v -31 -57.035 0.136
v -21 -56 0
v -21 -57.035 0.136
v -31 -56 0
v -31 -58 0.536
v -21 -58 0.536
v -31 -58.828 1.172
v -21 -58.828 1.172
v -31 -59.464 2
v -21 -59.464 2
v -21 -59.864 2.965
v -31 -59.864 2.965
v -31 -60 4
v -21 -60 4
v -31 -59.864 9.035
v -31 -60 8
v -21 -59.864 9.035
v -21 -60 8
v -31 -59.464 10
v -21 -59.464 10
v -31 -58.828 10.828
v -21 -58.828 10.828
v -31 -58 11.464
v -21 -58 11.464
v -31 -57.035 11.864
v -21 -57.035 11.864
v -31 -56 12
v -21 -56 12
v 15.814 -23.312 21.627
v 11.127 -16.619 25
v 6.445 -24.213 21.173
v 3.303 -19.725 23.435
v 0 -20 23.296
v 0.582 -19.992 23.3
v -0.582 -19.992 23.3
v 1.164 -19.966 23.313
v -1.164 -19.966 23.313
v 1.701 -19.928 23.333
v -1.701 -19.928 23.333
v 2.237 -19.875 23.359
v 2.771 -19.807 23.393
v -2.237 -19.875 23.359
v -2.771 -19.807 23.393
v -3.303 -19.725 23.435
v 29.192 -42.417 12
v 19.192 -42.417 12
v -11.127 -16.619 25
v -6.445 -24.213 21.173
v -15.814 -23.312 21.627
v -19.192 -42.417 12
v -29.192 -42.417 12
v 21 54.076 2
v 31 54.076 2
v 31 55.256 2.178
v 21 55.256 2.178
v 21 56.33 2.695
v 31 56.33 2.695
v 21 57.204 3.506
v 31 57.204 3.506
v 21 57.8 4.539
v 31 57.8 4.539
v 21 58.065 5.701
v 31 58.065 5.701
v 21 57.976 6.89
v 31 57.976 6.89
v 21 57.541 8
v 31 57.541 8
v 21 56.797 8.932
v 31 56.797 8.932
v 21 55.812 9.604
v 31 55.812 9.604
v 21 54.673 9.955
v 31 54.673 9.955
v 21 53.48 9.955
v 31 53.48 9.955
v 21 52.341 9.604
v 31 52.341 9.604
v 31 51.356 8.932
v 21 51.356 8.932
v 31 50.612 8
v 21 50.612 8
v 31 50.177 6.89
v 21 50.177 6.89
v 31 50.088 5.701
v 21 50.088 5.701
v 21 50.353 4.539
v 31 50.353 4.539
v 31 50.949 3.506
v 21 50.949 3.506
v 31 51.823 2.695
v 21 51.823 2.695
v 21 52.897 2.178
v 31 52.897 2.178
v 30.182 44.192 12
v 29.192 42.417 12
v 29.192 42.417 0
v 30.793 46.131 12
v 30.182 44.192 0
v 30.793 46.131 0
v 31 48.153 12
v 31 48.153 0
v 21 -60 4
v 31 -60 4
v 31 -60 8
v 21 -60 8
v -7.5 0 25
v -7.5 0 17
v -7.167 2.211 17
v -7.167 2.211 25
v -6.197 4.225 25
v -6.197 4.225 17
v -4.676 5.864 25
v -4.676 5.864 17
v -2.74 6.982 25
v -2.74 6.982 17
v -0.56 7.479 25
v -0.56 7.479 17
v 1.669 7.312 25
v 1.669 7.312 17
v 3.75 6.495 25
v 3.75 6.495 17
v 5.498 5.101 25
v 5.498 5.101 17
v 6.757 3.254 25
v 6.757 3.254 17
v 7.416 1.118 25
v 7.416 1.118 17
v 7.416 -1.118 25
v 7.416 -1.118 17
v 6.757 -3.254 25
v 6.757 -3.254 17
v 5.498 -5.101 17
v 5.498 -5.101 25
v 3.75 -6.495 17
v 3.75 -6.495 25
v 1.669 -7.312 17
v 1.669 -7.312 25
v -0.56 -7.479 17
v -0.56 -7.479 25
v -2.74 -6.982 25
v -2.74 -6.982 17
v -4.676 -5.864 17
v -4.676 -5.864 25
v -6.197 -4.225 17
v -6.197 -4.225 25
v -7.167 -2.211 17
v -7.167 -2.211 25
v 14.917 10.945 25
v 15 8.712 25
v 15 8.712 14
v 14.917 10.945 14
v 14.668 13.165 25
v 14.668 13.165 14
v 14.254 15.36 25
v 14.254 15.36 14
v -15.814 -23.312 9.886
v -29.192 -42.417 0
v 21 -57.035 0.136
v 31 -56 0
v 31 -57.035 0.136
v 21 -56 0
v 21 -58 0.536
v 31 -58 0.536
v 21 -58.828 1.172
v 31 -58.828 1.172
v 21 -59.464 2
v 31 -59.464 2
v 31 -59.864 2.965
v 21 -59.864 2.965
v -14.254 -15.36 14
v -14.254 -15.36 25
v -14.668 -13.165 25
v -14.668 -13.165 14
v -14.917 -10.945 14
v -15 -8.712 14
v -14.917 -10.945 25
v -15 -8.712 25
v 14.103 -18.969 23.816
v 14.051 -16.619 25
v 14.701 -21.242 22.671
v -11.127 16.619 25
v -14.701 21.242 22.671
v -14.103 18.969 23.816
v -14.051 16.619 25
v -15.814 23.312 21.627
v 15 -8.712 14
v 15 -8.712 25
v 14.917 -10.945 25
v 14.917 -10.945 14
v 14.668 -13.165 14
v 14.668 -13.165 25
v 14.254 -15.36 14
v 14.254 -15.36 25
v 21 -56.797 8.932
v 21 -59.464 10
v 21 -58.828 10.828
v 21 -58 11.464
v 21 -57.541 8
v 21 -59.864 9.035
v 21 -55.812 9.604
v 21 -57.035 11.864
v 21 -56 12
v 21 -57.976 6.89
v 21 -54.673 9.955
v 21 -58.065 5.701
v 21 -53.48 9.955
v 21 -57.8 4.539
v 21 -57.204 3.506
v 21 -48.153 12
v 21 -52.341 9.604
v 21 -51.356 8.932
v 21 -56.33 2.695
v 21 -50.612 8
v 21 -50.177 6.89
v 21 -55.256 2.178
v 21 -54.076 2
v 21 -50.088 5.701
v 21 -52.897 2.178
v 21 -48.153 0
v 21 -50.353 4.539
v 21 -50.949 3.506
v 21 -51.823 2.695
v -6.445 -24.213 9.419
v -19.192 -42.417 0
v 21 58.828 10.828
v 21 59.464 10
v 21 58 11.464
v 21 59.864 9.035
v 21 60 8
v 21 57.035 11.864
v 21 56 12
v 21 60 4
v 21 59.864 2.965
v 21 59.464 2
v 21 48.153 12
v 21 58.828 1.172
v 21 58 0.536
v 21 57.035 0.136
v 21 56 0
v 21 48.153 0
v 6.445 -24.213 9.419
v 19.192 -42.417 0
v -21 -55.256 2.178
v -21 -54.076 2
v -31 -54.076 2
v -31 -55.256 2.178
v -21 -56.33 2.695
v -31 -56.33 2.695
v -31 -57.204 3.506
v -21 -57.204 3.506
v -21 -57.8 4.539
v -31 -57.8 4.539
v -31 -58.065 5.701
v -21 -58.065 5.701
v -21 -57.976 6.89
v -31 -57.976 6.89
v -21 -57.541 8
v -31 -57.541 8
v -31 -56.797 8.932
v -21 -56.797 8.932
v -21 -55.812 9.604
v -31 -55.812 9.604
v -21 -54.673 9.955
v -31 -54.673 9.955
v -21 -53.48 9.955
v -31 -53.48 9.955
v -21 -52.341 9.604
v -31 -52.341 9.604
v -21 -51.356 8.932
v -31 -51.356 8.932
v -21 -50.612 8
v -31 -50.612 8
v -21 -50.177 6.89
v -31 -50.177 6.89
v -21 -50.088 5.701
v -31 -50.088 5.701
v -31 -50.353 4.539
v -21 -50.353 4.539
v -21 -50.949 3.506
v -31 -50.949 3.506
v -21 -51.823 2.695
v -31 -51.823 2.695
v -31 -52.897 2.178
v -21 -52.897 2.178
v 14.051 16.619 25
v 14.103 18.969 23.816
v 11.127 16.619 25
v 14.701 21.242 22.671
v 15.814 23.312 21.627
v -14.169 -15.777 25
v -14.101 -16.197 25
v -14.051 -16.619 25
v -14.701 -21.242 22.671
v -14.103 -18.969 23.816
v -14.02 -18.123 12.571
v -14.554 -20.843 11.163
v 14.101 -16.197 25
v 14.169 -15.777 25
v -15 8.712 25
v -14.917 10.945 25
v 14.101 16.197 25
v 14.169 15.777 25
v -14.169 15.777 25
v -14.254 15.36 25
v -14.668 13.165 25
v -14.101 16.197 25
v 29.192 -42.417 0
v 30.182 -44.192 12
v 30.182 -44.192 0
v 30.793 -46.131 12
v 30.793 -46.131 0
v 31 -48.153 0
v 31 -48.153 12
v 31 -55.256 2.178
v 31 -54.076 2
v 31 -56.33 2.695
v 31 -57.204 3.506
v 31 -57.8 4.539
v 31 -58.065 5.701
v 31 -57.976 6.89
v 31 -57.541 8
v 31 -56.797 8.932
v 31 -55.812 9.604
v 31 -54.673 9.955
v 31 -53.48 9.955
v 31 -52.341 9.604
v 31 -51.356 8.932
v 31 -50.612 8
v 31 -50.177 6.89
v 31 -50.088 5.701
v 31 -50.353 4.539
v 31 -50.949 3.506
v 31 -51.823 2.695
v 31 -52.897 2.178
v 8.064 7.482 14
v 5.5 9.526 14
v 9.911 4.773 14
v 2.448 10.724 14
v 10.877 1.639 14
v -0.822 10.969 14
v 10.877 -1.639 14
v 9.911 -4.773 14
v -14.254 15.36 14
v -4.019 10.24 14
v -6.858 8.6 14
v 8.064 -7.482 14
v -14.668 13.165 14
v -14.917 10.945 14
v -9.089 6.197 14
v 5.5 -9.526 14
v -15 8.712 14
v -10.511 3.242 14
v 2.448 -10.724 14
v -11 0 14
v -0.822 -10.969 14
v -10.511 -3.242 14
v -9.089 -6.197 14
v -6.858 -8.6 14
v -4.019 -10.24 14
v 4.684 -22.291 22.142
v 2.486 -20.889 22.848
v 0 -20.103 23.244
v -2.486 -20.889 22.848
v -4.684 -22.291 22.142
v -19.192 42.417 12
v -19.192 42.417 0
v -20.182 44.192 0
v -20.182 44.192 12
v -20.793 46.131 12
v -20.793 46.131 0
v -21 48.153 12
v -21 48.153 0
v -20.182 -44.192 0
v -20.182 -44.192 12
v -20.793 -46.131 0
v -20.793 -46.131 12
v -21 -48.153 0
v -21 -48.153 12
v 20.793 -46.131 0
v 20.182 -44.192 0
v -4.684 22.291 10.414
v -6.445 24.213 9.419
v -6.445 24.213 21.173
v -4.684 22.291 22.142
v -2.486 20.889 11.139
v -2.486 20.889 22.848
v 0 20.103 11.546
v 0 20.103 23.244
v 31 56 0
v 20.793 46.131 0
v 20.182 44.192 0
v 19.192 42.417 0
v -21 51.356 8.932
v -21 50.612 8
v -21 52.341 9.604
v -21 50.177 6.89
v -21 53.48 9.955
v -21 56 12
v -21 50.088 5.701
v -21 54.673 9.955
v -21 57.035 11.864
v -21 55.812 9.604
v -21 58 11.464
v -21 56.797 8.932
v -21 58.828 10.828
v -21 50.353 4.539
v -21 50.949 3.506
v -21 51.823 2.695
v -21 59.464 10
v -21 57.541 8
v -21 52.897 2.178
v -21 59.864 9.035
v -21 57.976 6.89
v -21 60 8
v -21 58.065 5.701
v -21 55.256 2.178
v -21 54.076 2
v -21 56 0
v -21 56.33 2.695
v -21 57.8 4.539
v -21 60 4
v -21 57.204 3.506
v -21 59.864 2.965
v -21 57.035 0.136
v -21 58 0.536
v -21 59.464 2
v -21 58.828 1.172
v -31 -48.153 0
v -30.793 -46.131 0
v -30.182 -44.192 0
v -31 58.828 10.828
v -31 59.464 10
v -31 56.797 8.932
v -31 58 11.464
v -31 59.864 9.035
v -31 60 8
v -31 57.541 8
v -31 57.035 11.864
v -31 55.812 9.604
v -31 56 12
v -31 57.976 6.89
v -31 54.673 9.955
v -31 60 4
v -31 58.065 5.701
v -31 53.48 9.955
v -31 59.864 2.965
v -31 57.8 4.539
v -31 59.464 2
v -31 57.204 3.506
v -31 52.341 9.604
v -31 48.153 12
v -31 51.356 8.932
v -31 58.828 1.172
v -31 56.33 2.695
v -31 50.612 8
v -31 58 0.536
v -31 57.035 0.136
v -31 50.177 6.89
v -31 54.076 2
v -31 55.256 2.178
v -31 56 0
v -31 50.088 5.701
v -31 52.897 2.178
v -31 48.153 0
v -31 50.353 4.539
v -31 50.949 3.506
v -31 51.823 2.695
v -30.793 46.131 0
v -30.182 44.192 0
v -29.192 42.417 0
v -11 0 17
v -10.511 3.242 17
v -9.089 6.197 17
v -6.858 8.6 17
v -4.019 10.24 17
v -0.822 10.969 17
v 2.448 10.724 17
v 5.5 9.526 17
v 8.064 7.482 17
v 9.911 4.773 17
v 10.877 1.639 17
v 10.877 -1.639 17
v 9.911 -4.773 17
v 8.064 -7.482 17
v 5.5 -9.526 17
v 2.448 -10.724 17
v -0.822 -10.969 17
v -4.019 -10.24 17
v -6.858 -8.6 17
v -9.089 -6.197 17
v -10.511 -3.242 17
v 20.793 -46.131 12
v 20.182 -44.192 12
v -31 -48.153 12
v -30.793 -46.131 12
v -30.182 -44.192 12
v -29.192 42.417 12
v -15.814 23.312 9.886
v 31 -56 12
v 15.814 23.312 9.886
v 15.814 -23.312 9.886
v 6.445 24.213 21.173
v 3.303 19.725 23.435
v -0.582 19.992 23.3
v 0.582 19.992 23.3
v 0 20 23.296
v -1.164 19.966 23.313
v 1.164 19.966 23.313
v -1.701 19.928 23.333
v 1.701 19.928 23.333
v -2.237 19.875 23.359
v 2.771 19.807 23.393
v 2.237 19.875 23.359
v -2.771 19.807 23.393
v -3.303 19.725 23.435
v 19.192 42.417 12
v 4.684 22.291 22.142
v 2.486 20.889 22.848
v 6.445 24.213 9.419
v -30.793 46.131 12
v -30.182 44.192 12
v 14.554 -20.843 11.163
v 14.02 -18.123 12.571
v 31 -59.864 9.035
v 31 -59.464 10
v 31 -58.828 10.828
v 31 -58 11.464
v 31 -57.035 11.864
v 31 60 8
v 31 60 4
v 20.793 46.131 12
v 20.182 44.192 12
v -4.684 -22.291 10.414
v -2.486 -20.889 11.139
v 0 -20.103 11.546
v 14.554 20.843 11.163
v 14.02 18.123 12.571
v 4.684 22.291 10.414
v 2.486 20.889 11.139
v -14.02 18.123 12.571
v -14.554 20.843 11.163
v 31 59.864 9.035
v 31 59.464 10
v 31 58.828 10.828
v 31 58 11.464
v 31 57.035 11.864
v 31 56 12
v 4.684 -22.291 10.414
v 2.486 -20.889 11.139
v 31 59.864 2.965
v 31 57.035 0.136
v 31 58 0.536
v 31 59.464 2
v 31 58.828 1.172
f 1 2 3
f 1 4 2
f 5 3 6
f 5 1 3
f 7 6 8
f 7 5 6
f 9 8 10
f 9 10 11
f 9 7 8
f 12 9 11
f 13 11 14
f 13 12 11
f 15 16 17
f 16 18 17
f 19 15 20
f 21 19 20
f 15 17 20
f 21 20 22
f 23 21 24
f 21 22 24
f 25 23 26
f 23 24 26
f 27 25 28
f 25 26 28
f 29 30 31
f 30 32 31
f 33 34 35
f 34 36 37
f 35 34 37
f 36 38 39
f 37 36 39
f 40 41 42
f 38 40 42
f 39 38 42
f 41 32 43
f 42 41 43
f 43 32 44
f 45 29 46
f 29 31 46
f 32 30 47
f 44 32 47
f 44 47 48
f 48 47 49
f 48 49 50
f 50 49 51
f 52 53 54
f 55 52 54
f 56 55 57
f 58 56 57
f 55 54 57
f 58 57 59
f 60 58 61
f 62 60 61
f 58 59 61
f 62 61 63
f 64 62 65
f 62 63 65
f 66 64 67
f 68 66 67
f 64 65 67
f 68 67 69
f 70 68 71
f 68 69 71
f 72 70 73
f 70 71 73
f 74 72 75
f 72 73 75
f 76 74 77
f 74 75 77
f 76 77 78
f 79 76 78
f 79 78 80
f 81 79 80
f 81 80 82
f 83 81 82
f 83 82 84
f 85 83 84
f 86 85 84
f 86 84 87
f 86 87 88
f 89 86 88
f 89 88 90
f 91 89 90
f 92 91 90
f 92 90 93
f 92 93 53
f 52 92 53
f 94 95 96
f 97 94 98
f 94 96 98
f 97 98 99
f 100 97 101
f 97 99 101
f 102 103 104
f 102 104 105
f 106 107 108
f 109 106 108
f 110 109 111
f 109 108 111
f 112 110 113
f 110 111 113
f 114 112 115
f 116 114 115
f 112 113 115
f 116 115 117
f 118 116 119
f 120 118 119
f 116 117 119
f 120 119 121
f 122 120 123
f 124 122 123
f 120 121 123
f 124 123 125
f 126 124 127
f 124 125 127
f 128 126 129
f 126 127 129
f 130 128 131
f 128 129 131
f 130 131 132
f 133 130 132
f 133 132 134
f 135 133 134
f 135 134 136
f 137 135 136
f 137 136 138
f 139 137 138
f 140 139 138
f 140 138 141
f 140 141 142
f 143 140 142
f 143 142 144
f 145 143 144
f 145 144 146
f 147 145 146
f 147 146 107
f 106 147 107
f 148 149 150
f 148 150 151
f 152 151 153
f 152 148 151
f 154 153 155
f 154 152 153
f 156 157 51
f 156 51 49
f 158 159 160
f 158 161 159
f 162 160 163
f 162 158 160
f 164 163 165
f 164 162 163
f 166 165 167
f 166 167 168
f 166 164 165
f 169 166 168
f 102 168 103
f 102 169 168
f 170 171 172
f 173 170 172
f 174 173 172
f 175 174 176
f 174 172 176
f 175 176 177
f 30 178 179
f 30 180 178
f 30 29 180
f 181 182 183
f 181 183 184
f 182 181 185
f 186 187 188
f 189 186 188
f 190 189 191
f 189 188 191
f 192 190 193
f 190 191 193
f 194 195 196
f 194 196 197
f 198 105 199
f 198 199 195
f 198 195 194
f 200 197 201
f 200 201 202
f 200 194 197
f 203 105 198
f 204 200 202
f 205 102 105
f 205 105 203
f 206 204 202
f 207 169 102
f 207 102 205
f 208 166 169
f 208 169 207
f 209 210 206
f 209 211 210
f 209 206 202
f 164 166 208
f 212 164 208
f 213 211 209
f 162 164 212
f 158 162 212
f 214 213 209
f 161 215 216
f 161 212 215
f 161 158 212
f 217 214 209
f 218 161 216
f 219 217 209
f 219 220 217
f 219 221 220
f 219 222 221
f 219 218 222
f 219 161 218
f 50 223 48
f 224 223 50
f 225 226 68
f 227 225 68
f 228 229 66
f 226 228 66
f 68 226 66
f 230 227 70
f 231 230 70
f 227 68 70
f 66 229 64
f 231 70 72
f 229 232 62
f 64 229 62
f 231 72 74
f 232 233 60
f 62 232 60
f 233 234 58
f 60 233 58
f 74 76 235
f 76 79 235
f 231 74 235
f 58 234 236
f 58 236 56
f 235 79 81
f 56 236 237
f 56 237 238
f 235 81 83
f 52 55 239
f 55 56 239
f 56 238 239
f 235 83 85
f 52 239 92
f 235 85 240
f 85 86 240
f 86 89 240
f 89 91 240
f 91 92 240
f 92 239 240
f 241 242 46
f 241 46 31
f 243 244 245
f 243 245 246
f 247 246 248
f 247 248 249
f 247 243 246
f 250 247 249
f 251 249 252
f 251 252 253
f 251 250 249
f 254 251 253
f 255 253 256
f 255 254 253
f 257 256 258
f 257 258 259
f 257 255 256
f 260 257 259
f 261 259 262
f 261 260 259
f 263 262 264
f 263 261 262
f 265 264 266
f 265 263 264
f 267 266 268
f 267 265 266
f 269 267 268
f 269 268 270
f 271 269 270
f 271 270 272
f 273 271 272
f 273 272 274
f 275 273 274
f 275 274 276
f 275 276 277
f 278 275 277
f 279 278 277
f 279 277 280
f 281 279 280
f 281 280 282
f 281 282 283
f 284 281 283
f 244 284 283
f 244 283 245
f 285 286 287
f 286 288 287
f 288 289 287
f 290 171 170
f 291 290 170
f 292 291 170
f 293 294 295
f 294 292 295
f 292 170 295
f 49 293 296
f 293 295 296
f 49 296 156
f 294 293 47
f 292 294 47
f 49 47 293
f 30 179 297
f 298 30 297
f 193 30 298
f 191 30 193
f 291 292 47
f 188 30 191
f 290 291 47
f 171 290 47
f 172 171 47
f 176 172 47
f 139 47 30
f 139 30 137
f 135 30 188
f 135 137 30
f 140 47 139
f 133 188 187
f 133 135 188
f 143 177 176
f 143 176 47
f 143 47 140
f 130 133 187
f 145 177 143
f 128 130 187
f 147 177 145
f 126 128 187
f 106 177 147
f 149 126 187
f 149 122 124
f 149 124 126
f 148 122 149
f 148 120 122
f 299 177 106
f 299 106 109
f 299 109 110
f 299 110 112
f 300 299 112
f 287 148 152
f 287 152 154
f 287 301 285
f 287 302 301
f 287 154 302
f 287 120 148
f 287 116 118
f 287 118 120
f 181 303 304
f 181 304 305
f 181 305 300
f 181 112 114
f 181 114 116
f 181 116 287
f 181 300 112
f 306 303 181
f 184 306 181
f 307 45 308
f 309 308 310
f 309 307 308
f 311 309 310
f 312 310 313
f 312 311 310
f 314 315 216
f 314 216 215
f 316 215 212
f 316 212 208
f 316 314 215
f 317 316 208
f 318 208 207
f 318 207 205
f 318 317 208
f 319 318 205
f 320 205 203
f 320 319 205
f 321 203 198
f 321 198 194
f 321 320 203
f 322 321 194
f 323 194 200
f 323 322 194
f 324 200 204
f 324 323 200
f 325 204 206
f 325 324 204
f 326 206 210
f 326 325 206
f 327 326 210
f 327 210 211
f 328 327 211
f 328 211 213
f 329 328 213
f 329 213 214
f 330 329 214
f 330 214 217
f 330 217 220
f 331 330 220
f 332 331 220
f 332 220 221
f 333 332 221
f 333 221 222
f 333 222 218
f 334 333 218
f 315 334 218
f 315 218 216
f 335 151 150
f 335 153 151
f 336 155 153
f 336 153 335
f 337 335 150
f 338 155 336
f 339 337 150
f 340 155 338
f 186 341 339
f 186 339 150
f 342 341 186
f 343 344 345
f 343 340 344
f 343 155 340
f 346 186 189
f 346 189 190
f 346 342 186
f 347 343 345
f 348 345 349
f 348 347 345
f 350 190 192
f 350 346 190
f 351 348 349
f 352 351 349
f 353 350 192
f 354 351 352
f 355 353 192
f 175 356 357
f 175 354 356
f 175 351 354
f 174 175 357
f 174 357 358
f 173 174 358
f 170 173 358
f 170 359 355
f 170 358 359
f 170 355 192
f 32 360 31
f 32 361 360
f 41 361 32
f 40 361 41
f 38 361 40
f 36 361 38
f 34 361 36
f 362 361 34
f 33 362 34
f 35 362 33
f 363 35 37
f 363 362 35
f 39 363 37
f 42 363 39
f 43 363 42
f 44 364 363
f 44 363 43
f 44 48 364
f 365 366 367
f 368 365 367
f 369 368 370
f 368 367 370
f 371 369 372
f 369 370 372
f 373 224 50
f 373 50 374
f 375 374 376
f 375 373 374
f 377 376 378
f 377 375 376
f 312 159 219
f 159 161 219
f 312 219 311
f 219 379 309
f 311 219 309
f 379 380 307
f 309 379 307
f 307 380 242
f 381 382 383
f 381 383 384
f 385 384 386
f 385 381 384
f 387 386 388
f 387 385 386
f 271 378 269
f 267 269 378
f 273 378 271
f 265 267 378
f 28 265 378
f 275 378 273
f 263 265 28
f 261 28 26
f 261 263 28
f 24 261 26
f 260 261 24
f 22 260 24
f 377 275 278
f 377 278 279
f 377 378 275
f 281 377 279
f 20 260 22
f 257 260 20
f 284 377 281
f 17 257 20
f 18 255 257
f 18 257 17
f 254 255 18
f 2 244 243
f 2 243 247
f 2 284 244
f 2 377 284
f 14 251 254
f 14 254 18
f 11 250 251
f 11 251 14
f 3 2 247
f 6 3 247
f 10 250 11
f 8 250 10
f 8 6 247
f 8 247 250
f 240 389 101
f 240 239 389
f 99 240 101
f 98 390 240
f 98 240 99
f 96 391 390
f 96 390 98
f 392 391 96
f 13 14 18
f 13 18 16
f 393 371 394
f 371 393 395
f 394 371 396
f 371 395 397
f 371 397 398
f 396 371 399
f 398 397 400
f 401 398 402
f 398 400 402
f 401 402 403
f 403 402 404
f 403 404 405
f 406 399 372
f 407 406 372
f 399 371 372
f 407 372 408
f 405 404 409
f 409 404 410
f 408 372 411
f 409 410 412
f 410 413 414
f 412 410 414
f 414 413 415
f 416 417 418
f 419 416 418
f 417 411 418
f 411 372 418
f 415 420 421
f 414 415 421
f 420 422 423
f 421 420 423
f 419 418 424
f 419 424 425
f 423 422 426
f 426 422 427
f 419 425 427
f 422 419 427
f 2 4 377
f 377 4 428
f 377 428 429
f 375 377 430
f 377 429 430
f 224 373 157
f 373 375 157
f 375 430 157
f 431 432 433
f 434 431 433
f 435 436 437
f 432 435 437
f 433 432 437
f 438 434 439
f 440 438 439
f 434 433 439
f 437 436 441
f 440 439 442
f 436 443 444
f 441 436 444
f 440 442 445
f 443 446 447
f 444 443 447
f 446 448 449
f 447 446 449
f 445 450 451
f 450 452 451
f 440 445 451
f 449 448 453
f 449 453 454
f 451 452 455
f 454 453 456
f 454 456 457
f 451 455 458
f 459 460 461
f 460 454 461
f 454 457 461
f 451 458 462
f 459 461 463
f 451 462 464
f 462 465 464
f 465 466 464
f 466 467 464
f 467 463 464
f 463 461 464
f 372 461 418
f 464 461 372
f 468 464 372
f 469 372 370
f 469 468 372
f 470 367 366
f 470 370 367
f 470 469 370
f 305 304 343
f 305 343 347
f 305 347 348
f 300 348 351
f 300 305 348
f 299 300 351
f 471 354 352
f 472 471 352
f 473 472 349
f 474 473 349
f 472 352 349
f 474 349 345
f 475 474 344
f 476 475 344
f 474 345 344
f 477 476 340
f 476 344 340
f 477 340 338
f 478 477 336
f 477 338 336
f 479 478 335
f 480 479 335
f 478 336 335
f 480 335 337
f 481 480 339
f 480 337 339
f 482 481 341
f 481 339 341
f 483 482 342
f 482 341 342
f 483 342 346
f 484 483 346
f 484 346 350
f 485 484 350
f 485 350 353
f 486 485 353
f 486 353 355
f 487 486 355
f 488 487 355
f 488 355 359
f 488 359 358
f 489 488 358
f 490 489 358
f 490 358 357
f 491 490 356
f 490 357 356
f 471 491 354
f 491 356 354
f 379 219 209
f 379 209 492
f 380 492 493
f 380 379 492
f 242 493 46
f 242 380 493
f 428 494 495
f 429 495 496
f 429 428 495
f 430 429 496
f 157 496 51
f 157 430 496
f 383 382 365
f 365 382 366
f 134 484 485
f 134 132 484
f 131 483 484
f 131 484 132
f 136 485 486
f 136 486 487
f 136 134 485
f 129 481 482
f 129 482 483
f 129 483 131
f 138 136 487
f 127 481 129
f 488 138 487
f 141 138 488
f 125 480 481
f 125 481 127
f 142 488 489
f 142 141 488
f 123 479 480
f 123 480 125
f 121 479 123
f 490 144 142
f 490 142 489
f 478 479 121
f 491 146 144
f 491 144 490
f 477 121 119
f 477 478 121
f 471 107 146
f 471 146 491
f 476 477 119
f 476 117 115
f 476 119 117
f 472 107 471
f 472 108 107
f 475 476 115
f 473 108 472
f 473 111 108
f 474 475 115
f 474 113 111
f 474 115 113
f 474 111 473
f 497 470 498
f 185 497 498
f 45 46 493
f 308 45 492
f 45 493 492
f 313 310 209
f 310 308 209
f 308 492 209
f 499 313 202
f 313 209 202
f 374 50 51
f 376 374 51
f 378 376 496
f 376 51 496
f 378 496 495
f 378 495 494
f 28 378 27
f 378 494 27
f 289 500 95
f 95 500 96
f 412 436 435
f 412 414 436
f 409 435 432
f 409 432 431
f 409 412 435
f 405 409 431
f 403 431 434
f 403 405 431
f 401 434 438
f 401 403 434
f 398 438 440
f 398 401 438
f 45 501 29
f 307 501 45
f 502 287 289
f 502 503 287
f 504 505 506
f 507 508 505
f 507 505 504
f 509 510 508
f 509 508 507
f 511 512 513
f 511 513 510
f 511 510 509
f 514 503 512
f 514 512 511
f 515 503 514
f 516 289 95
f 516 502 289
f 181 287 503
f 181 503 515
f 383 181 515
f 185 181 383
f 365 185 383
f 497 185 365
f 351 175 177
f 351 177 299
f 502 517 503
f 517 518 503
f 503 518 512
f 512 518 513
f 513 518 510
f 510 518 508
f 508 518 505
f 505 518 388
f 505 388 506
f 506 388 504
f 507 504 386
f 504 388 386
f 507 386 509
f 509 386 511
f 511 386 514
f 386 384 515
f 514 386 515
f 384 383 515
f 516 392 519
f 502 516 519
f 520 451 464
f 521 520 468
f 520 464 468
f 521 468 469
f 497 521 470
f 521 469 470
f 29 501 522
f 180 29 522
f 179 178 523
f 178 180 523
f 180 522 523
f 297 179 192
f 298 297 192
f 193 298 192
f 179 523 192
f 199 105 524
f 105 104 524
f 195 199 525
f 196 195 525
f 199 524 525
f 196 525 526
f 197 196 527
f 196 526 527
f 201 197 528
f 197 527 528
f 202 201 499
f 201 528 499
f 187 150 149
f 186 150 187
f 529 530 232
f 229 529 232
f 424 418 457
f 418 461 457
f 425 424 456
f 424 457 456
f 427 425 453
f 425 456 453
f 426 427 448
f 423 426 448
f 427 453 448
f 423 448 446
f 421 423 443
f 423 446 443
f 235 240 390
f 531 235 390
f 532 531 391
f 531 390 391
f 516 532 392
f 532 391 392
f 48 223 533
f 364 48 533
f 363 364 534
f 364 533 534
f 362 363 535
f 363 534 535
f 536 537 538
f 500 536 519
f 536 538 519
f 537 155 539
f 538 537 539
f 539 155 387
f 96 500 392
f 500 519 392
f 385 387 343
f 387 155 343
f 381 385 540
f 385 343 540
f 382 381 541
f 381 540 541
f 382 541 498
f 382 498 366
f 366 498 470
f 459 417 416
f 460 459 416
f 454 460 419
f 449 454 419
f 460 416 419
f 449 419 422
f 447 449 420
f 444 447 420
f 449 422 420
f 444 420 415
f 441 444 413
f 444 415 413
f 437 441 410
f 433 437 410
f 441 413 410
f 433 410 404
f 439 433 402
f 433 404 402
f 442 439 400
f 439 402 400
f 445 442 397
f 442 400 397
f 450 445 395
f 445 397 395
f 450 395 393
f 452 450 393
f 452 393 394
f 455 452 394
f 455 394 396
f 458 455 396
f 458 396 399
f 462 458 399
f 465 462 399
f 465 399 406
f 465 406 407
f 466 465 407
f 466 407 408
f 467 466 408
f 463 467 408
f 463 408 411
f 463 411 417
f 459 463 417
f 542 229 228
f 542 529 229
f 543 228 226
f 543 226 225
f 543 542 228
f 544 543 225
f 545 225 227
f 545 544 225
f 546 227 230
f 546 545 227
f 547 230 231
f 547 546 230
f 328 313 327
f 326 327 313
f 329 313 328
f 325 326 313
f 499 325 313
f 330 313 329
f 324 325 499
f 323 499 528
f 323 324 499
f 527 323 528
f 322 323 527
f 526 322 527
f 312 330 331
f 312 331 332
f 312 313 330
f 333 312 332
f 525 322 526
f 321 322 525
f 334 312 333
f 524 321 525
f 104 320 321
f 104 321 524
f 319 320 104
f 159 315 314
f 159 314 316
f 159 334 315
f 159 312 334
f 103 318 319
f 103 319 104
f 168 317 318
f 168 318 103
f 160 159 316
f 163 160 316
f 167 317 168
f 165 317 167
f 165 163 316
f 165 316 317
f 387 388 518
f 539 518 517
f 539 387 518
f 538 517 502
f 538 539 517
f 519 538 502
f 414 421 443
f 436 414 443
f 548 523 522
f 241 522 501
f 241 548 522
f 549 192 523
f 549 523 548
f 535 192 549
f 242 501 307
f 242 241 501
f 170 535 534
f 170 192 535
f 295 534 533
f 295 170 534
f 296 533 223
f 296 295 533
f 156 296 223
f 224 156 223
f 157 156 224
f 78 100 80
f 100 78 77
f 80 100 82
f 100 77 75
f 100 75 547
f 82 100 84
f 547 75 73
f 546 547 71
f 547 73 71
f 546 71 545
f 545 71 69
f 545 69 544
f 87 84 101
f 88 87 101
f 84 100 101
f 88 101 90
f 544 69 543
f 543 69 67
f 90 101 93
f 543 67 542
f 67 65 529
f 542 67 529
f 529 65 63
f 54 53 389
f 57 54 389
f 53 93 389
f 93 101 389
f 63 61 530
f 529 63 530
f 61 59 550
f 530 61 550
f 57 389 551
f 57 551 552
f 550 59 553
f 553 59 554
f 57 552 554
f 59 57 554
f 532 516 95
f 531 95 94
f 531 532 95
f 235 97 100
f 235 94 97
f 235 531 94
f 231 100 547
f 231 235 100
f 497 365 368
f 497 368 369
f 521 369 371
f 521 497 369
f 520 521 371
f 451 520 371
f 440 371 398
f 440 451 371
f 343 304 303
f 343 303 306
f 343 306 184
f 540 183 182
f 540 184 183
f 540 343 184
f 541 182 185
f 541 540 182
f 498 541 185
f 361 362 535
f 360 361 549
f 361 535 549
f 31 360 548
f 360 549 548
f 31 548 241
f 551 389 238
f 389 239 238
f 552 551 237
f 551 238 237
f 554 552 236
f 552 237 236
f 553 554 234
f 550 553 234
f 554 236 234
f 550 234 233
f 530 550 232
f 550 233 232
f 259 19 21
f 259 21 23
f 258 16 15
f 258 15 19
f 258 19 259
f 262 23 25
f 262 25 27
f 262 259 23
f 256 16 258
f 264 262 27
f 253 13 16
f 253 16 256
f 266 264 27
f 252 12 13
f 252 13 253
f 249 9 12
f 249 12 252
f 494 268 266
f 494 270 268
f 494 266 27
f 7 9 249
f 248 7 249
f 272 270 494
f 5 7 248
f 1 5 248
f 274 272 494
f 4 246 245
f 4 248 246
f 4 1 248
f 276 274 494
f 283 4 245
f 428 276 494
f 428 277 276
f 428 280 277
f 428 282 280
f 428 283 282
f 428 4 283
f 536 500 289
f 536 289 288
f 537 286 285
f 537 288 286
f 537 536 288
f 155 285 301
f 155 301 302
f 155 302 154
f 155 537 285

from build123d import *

# Parameters (mm, degrees)
BOSS_EXTRUDE1_DEPTH     = 30
CUT_EXTRUDE1_DEPTH      = 74.898579147
CUT_EXTRUDE1_DEPTH_BACK = 74.898579147
FILLET1_R               = 10
FILLET2_R               = 30
CUT_EXTRUDE2_DEPTH      = 73.01388755
CUT_EXTRUDE2_DEPTH_BACK = 73.01388755
FILLET3_R               = 10
SKETCH4_R               = 4
CUT_EXTRUDE3_DEPTH      = 90.827612681
FILLET4_R               = 4
SKETCH5_R               = 11
SKETCH5_R_2             = 7.5
CUT_EXTRUDE4_DEPTH      = 3
SKETCH5_2_R             = 7.5
CUT_EXTRUDE6_DEPTH      = 69.971008402


with BuildPart() as part:
    # Sketch1 → Boss-Extrude1 (new body)
    with BuildSketch(Plane.XY):
        with BuildLine():
            Line((-21, 48.152987889), (-21, 60))
            Line((-21, 60), (-31, 60))
            Line((-31, 60), (-31, 48.152987889))
            ThreePointArc((-31, 48.152987889), (-30.537169507, 45.145929894), (-29.191520443, 42.417223525))
            Line((-29.191520443, 42.417223525), (-11.127260537, 16.618786747))
            ThreePointArc((-11.127260537, 16.618786747), (-13.173135996, 15.048869992), (-15, 13.228756555))
            Line((-15, 13.228756555), (-15, 0))
            Line((-15, 0), (15, 0))
            Line((15, 0), (15, 13.228756555))
            ThreePointArc((15, 13.228756555), (13.173135996, 15.048869992), (11.127260537, 16.618786747))
            Line((11.127260537, 16.618786747), (29.191520443, 42.417223525))
            ThreePointArc((29.191520443, 42.417223525), (30.537169507, 45.145929894), (31, 48.152987889))
            Line((31, 48.152987889), (31, 60))
            Line((31, 60), (21, 60))
            Line((21, 60), (21, 48.152987889))
            ThreePointArc((21, 48.152987889), (20.537169507, 45.145929894), (19.191520443, 42.417223525))
            Line((19.191520443, 42.417223525), (3.302564109, 19.725442208))
            ThreePointArc((3.302564109, 19.725442208), (0, 20), (-3.302564109, 19.725442208))
            Line((-3.302564109, 19.725442208), (-19.191520443, 42.417223525))
            ThreePointArc((-19.191520443, 42.417223525), (-20.537169507, 45.145929894), (-21, 48.152987889))
        make_face()
    extrude(amount=BOSS_EXTRUDE1_DEPTH)

    # Sketch2 → Cut-Extrude1 (cut, two sides: drawn at the far end of the back side and taken through both)
    with BuildSketch(Plane(origin=(0, 0, 0), x_dir=(0, 0, -1), z_dir=(1, 0, 0)).offset(-CUT_EXTRUDE1_DEPTH_BACK)):
        Polygon((-25, 0), (-25, 16.618786747), (-12, 42.417223525), (-12, 60), (-30, 60), (-30, 0), align=None)
    extrude(amount=CUT_EXTRUDE1_DEPTH + CUT_EXTRUDE1_DEPTH_BACK, mode=Mode.SUBTRACT)

    # Fillet1
    # the kernel refuses this fillet: 10 mm, written as the material it adds along each edge
    with BuildSketch(Plane(origin=(11.127260537, 16.618786747, 0), x_dir=(0.75244349959859, -0.6586567997916871, 0), z_dir=(0, 0, 1))) as fillet1_piece_1_section:
        with BuildLine():
            CenterArc((9.059445237, 9.202818325), FILLET1_R, 186.19751299, 60.769805767)
            Line((-0.882111272, 8.123256295), (-1.080942402, 8.101665055))
            Line((-1.080942402, 8.101665055), (-0.19883113, -0.021591241))
            Line((-0.19883113, -0.021591241), (0.02573442, -0.198337439))
            ThreePointArc((0.02573442, -0.198337439), (2.573442036, -0.033743875), (5.068632849, -0.184056367))
            Line((5.068632849, -0.184056367), (5.146884072, 0))
        make_face()
    fillet1_piece_1 = extrude(amount=25, mode=Mode.PRIVATE)
    fillet1_piece_1 = split(fillet1_piece_1, bisect_by=Plane(origin=(13.208648134, 22.312499117, 22.130901324), z_dir=(0, -0.4500023080786392, -0.8930273919224972)), keep=Keep.TOP, mode=Mode.PRIVATE)
    add(fillet1_piece_1)
    with BuildSketch(Plane(origin=(-11.127260537, 16.618786747, 0), x_dir=(-0.573576436351047, 0.819152044288991, 0), z_dir=(0, 0, 1))) as fillet1_piece_2_section:
        with BuildLine():
            CenterArc((8.171010533, 10), FILLET1_R, 209.230194233, 60.769805767)
            Line((-0.555638062, 5.116803885), (-0.730171033, 5.019139963))
            ThreePointArc((-0.730171033, 5.019139963), (-0.311365695, 2.554759082), (-0.199956476, 0.004172263))
            Line((-0.199956476, 0.004172263), (0, -0.2))
            Line((0, -0.2), (8.171010533, -0.2))
            Line((8.171010533, -0.2), (8.171010533, 0))
        make_face()
    fillet1_piece_2 = extrude(amount=25, mode=Mode.PRIVATE)
    fillet1_piece_2 = split(fillet1_piece_2, bisect_by=Plane(origin=(-15.334467923, 27.154175935, 19.691148901), z_dir=(0, -0.4500023080786392, -0.8930273919224972)), keep=Keep.TOP, mode=Mode.PRIVATE)
    add(fillet1_piece_2)

    # Fillet2
    fillet2_edges = [part.edges().sort_by_distance(p)[0] for p in [
        (-15, 13.228756555, 12.5),
        (15, 13.228756555, 12.5),
    ]]
    fillet(fillet2_edges, radius=FILLET2_R)

    # Sketch3 → Cut-Extrude2 (cut, two sides: drawn at the far end of the back side and taken through both)
    with BuildSketch(Plane(origin=(0, 0, 0), x_dir=(0, 0, -1), z_dir=(1, 0, 0)).offset(-CUT_EXTRUDE2_DEPTH_BACK)):
        Polygon((-14, 0), (-14, 15.360293774), (0, 42.417223525), (0, 0), align=None)
    extrude(amount=CUT_EXTRUDE2_DEPTH + CUT_EXTRUDE2_DEPTH_BACK, mode=Mode.SUBTRACT)

    # Fillet3
    # the kernel refuses this fillet: 10 mm, written as the material it adds along each edge
    with BuildSketch(Plane(origin=(3.302564109, 19.725442208, -1.95547457), x_dir=(-0.9985520834372477, 0.053793463014867454, 0), z_dir=(0, 0, 1))) as fillet3_piece_1_section:
        with BuildLine():
            CenterArc((5.591706065, -9.937268887), FILLET3_R, 96.421055445, 51.662571373)
            Line((-2.896500368, -4.650459684), (0, 0))
            ThreePointArc((0, 0), (2.236682426, -0.125462226), (4.473364852, 0))
        make_face()
    fillet3_piece_1 = extrude(amount=39.086837339, mode=Mode.PRIVATE)
    fillet3_piece_1 = split(fillet3_piece_1, bisect_by=Plane(origin=(3.109386203, 18.47326219, 12.38926448), z_dir=(0, 0.45955333907229245, 0.888150172294926)), keep=Keep.TOP, mode=Mode.PRIVATE)
    fillet3_piece_1 = split(fillet3_piece_1, bisect_by=Plane(origin=(3.109386203, 23.215327511, 21.675960227), z_dir=(0, -0.4500023080791268, -0.8930273919222517)), keep=Keep.TOP, mode=Mode.PRIVATE)
    add(fillet3_piece_1)
    with BuildSketch(Plane(origin=(-3.302564109, 19.725442208, -1.95547457), x_dir=(-0.5735764363510474, 0.8191520442889909, 0), z_dir=(0, 0, 1))) as fillet3_piece_2_section:
        with BuildLine():
            CenterArc((5.47873066, -10), FILLET3_R, 90, 51.662571373)
            ThreePointArc((-2.364982647, -3.797084431), (-1.075996396, -1.964871701), (0, 0))
            Line((0, 0), (5.47873066, 0))
        make_face()
    fillet3_piece_2 = extrude(amount=39.086837339, mode=Mode.PRIVATE)
    fillet3_piece_2 = split(fillet3_piece_2, bisect_by=Plane(origin=(-3.109386203, 18.47326219, 12.38926448), z_dir=(0, 0.45955333907229245, 0.888150172294926)), keep=Keep.TOP, mode=Mode.PRIVATE)
    fillet3_piece_2 = split(fillet3_piece_2, bisect_by=Plane(origin=(-3.109386203, 23.215327511, 21.675960227), z_dir=(0, -0.4500023080791268, -0.8930273919222517)), keep=Keep.TOP, mode=Mode.PRIVATE)
    add(fillet3_piece_2)

    # Sketch4 → Cut-Extrude3 (cut, through all)
    with BuildSketch(Plane(origin=(31, 0, 0), x_dir=(0, 0, -1), z_dir=(1, 0, 0))):
        with Locations((-6, 54.076493944)):
            Circle(SKETCH4_R)
    extrude(amount=-CUT_EXTRUDE3_DEPTH, mode=Mode.SUBTRACT)

    # Fillet4
    fillet4_edges = [part.edges().sort_by_distance(p)[0] for p in [
        (-26, 60, 0),
        (26, 60, 0),
        (26, 60, 12),
        (-26, 60, 12),
    ]]
    fillet(fillet4_edges, radius=FILLET4_R)

    # Mirror2: part across plane


with BuildPart() as part_1:
    add(part.part)
    add(part.part.mirror(Plane(origin=(0, 0, 30), x_dir=(0, 0, 1), z_dir=(0, 1, 0))))

    # Sketch5 → Cut-Extrude4 (cut)
    with BuildSketch(Plane(origin=(0, 0, 14), x_dir=(-1, 0, 0), z_dir=(0, 0, -1))):
        Circle(SKETCH5_R)
        Circle(SKETCH5_R_2, mode=Mode.SUBTRACT)
    extrude(amount=-CUT_EXTRUDE4_DEPTH, mode=Mode.SUBTRACT)

    # Sketch5<2> → Cut-Extrude6 (cut, through all)
    with BuildSketch(Plane(origin=(0, 0, 14), x_dir=(-1, 0, 0), z_dir=(0, 0, -1))):
        Circle(SKETCH5_2_R)
    extrude(amount=-CUT_EXTRUDE6_DEPTH, mode=Mode.SUBTRACT)


solid = part_1.part
